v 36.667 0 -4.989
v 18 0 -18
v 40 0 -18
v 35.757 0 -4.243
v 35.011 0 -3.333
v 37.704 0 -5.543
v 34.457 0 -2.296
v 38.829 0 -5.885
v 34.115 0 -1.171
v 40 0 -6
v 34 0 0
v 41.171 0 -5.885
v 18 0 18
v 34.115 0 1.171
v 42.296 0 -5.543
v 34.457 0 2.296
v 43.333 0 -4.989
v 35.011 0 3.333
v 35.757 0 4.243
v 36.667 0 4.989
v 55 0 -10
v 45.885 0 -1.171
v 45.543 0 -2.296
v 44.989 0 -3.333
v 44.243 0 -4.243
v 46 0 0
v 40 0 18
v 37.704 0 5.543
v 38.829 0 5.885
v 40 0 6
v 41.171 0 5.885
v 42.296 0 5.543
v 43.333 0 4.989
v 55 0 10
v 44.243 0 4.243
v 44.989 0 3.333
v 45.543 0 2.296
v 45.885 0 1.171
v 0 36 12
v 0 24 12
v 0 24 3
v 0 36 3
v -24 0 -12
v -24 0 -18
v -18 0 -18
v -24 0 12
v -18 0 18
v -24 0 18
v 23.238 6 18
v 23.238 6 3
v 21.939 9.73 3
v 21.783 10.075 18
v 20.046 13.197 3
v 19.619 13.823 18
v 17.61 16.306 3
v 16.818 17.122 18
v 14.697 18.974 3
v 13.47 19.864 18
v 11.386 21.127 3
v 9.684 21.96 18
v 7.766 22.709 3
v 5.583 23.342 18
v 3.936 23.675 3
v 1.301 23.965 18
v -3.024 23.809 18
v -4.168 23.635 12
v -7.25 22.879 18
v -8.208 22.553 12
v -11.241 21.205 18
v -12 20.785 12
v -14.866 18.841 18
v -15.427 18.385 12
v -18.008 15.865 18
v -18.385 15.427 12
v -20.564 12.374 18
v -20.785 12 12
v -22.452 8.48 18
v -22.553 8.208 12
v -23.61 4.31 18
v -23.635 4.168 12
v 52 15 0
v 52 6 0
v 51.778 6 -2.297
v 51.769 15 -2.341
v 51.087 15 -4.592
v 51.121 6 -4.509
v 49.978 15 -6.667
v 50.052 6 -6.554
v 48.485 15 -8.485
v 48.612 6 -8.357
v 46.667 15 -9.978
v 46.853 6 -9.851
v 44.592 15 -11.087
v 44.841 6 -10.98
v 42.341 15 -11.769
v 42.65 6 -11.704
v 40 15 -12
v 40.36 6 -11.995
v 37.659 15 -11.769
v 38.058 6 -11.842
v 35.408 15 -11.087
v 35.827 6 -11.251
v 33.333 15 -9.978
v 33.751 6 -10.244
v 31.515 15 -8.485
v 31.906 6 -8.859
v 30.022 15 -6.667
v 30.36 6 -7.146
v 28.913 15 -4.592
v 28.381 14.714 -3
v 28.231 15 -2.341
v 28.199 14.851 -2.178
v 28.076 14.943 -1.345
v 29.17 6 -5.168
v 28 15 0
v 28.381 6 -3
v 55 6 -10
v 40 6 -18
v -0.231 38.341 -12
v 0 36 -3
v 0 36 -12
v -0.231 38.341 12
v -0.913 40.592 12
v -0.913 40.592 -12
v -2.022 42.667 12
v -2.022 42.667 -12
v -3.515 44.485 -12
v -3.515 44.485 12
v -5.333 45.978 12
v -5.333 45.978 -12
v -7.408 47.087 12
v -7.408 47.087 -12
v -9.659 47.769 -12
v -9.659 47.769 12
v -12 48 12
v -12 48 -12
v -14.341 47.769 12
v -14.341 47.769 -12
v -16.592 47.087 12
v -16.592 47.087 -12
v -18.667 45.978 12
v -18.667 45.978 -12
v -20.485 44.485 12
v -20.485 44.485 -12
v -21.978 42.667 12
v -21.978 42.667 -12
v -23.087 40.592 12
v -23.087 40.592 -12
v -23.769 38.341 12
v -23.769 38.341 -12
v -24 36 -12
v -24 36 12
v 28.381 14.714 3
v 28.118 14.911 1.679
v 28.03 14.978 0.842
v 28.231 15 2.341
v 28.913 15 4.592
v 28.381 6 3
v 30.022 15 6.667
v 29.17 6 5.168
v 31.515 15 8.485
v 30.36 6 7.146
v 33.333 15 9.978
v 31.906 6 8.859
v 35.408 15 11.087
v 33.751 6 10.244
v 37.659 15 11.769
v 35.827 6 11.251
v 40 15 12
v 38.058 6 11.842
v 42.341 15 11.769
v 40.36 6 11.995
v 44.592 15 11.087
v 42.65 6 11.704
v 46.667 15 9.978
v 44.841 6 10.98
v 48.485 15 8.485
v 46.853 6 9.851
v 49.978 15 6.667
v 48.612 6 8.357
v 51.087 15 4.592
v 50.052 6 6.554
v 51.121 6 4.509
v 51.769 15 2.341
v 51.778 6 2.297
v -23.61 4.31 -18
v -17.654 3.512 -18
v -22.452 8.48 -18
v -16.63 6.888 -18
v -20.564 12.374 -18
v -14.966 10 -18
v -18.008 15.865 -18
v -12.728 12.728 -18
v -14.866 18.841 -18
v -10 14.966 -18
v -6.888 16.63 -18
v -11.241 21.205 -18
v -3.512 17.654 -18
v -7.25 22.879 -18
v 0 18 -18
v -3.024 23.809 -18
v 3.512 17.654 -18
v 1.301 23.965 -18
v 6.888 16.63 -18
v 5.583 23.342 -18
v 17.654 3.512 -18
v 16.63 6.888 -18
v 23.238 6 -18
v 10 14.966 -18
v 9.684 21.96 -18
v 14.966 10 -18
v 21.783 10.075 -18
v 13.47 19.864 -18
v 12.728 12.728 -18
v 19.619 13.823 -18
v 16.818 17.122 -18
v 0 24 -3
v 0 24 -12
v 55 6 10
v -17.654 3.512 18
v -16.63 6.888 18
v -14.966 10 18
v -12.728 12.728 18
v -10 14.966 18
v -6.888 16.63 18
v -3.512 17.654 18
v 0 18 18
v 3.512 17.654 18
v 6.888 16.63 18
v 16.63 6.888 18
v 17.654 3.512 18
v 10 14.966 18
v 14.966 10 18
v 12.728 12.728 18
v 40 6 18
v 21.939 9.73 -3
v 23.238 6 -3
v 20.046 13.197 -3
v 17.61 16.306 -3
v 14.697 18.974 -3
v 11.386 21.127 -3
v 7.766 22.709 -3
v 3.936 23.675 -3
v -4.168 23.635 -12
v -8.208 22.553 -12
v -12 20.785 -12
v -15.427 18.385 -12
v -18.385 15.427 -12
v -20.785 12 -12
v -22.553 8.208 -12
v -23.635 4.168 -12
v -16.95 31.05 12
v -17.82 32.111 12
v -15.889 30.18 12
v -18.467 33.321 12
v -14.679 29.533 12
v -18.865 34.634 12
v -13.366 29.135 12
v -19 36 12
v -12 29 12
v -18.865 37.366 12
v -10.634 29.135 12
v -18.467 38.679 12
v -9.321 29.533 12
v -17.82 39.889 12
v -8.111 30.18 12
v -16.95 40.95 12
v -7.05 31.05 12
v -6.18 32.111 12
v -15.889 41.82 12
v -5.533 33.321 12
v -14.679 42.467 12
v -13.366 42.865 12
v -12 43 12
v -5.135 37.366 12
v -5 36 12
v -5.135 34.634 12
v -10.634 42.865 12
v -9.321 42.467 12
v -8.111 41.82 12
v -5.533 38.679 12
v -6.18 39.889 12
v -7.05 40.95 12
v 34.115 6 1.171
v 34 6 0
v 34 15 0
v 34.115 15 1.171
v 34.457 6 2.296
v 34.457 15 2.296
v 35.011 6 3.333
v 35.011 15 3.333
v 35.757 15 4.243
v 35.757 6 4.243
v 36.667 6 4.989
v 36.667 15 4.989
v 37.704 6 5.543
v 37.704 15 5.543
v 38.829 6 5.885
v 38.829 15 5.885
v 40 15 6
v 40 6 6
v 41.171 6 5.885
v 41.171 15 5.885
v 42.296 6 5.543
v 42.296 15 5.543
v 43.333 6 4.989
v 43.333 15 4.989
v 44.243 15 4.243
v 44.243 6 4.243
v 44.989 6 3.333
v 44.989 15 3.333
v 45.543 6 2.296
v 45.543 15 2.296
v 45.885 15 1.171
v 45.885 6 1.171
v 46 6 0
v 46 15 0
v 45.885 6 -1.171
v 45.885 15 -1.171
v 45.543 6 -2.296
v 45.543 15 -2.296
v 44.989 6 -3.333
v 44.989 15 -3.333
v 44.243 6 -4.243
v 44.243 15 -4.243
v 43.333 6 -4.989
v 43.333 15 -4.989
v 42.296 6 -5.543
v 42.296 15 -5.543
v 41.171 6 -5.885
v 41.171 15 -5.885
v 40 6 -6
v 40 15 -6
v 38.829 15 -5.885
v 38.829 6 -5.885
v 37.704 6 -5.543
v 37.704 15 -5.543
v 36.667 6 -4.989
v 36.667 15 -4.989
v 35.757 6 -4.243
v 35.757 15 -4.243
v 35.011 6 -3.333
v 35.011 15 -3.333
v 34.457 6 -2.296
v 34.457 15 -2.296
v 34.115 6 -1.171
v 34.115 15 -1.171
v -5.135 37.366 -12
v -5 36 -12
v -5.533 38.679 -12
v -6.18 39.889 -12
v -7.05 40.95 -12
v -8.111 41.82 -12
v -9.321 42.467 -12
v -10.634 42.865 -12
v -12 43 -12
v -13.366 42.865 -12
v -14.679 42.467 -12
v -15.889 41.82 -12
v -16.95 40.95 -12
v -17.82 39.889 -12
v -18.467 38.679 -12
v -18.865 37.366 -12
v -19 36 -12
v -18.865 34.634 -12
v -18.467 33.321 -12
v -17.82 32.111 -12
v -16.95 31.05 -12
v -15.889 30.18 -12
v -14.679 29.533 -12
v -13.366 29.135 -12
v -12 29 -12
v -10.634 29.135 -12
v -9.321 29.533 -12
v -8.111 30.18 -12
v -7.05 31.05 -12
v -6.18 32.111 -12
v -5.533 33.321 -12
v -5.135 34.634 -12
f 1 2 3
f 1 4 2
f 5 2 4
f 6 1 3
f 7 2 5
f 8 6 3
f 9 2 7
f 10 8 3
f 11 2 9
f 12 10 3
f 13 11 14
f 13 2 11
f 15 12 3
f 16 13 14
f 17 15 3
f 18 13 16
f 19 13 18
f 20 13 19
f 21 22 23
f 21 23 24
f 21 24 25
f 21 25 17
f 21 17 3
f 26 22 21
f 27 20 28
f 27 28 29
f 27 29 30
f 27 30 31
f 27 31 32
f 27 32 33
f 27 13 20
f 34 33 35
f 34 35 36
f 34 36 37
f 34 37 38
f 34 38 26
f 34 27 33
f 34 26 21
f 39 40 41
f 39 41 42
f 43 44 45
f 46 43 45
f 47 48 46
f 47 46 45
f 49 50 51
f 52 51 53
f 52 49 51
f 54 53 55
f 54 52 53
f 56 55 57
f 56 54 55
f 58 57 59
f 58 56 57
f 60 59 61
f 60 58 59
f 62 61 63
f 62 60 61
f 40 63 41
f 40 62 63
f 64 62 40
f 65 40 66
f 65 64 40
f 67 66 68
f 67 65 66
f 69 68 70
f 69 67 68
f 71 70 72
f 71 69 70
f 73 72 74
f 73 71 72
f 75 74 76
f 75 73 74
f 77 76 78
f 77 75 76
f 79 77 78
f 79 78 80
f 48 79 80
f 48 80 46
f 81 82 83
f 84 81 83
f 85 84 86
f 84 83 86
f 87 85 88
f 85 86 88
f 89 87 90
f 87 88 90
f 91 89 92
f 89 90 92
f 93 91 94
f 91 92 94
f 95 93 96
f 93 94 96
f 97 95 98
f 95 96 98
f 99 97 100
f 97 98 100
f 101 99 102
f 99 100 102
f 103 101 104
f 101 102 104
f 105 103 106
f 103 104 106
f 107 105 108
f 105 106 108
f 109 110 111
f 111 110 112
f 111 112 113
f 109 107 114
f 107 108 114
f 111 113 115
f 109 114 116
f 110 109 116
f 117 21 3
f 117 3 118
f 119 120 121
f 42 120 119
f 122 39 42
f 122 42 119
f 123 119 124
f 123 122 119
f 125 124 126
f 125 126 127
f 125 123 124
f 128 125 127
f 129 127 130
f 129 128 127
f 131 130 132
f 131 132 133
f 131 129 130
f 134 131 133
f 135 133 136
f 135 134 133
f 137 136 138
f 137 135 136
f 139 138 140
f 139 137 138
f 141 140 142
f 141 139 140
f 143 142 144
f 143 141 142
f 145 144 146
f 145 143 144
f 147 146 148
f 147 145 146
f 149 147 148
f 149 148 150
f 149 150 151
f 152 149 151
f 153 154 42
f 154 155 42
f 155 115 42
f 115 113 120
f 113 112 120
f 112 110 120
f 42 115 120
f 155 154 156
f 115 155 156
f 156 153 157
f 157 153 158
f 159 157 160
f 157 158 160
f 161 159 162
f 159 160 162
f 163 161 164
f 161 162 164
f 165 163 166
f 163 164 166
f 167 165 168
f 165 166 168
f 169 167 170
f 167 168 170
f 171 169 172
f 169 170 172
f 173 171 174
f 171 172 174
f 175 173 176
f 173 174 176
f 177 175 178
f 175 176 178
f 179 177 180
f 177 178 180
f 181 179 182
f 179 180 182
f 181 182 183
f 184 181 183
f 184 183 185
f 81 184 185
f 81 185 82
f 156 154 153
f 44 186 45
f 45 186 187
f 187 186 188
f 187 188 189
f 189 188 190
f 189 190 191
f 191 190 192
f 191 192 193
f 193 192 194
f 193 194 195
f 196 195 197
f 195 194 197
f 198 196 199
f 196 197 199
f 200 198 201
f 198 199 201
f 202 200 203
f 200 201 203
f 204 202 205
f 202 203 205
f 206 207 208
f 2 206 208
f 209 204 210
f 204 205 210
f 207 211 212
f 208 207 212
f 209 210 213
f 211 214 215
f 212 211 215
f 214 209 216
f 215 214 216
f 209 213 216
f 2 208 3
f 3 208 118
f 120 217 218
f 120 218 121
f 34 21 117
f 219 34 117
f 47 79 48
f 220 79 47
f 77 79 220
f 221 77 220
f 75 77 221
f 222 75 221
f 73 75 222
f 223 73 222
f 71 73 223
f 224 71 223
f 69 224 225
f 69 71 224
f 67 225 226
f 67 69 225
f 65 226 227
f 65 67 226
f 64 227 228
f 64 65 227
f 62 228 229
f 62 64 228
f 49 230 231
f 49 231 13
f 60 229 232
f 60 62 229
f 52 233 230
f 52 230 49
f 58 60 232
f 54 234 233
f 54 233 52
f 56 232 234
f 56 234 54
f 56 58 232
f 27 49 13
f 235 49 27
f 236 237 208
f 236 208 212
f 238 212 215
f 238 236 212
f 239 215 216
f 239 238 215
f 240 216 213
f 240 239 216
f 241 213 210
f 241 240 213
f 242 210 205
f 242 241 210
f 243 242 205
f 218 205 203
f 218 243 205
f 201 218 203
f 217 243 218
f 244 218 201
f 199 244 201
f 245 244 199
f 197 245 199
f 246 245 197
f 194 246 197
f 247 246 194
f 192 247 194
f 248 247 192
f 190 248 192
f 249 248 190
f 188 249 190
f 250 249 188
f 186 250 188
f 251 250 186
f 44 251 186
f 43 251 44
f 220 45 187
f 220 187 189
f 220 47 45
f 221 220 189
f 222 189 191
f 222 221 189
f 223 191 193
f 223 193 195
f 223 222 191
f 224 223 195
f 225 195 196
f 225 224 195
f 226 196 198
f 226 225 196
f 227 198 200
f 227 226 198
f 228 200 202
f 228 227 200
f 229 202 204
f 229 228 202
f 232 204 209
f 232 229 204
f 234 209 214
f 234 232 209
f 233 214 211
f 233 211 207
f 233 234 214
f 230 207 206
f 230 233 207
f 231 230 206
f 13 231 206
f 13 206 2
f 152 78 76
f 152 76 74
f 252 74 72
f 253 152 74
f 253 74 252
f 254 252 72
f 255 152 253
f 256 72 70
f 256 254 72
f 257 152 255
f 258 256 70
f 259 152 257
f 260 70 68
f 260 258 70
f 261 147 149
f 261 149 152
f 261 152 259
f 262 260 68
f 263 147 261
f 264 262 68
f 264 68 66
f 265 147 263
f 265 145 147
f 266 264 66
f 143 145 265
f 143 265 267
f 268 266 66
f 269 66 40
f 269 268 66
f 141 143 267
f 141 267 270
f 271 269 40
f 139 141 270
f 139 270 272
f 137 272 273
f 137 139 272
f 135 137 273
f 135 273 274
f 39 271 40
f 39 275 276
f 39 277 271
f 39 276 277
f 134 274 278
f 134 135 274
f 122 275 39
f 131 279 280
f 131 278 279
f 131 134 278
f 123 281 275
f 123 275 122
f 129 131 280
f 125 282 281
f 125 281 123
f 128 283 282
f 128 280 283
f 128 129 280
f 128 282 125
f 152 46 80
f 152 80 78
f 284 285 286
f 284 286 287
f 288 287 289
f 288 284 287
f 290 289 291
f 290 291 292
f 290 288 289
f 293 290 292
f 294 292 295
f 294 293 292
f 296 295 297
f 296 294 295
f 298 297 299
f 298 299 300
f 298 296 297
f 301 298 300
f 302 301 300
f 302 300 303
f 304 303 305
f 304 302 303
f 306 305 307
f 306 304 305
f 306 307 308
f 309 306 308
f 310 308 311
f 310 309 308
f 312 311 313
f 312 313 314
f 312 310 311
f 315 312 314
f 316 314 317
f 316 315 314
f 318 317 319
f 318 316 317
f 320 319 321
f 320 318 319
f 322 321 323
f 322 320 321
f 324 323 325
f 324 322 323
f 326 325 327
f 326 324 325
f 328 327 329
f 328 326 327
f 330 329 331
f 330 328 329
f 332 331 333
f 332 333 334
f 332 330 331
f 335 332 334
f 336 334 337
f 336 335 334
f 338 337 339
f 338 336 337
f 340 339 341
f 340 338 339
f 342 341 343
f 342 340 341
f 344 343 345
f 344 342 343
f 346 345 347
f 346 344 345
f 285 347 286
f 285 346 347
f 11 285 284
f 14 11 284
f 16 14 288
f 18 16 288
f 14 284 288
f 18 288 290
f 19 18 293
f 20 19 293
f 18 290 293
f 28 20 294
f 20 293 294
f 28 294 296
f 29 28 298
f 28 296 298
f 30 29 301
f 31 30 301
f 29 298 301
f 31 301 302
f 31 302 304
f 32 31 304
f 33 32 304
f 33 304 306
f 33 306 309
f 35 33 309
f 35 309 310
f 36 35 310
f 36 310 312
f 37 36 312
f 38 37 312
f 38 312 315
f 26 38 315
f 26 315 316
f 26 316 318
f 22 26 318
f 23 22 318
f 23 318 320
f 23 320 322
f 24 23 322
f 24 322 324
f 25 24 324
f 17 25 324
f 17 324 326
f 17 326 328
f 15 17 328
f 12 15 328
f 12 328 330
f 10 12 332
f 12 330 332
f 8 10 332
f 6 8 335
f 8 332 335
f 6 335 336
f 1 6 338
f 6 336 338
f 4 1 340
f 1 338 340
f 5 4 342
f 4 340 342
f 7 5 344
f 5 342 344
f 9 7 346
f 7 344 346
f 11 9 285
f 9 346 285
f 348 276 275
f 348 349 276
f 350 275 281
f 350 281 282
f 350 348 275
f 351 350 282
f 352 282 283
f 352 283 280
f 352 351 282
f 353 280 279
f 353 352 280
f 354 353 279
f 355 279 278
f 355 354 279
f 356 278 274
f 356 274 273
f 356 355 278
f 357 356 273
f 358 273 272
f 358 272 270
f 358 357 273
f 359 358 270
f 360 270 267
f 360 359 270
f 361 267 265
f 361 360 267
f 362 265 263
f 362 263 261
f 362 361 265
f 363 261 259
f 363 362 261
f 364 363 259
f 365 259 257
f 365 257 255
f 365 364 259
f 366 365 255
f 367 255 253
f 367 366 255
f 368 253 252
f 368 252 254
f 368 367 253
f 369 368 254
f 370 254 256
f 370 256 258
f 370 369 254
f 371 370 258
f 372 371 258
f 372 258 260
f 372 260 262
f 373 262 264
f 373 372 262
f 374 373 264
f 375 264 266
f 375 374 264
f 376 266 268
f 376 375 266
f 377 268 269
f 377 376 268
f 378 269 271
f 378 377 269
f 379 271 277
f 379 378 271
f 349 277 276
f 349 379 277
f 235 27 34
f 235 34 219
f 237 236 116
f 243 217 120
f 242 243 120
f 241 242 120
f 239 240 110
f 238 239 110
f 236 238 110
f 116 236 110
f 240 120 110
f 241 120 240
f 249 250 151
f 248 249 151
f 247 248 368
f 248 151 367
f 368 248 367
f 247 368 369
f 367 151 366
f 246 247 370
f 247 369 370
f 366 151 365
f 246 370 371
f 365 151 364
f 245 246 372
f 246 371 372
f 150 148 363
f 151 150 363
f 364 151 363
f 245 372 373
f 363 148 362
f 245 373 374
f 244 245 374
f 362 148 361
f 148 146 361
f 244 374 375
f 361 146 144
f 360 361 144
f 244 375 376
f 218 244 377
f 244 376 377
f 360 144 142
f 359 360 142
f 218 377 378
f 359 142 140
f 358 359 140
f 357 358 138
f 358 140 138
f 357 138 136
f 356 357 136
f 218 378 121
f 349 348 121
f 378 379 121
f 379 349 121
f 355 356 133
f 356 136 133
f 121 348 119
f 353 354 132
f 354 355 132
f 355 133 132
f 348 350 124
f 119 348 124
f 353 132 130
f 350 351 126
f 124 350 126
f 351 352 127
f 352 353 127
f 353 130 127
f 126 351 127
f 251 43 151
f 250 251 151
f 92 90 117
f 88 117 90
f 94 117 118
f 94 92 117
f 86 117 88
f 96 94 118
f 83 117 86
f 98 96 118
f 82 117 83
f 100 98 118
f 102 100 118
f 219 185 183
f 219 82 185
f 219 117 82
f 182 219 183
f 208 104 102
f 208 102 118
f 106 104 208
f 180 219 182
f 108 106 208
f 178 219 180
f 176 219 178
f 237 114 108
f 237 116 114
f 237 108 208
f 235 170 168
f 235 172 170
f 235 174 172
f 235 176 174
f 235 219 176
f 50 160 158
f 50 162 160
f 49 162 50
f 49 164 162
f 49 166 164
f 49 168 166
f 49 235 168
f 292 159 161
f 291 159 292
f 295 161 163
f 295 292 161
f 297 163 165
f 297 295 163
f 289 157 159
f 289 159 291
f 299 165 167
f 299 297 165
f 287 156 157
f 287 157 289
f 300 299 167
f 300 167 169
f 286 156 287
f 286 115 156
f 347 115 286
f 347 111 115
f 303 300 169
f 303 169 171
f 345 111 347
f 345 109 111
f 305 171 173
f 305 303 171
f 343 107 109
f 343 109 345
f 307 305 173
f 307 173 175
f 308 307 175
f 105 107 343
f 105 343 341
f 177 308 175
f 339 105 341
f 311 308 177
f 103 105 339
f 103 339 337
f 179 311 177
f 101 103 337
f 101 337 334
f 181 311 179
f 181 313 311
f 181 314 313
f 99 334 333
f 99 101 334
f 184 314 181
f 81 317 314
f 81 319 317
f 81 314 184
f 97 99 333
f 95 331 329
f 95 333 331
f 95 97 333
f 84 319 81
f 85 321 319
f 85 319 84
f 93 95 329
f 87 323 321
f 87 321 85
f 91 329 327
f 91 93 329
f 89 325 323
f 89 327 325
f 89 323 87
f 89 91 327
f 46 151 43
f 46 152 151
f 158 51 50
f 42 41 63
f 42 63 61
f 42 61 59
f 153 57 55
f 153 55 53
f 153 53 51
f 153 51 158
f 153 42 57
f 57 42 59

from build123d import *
from build123d.topology import SkipClean

# Parameters (mm, degrees)
BOSS_EXTRUDE1_DEPTH = 18
SKETCH1_3_R         = 7
BOSS_EXTRUDE2_DEPTH = 12
SKETCH2_R           = 12
SKETCH2_R_2         = 6
BOSS_EXTRUDE3_DEPTH = 9
RIB1_START          = -3
RIB1_DEPTH          = 6
CHAMFER1_SIZE       = 8
CHAMFER1_SIZE2      = 15
CHAMFER2_SIZE       = 15
CHAMFER2_SIZE2      = 8
SKETCH2_2_R         = 6
CUT_EXTRUDE1_DEPTH  = 72.505244563


# Read off the part's stored shape, not the designer's step: Rib1
with BuildPart() as part:
    # Sketch1 → Boss-Extrude1 (new, symmetric)
    with BuildSketch(Plane.XY):
        with BuildLine():
            Line((18, 0), (24, 0))
            ThreePointArc((24, 0), (0, 24), (-24, 0))
            Line((-24, 0), (-18, 0))
            ThreePointArc((-18, 0), (0, 18), (18, 0))
        make_face()
        with BuildLine():
            Line((55, 6), (23.237900077, 6))
            ThreePointArc((23.237900077, 6), (23.80871271, 3.02410302), (24, 0))
            Line((24, 0), (55, 0))
            Line((55, 0), (55, 6))
        make_face()
    extrude(amount=BOSS_EXTRUDE1_DEPTH, both=True)

    # Sketch1<3> → Boss-Extrude2 (add, symmetric)
    with BuildSketch(Plane.XY):
        with BuildLine():
            Line((-24, 36), (-24, 0))
            ThreePointArc((-24, 0), (-16.970562748, 16.970562748), (0, 24))
            Line((0, 24), (0, 36))
            ThreePointArc((0, 36), (-12, 48), (-24, 36))
        make_face()
        with Locations((-12, 36)):
            Circle(SKETCH1_3_R, mode=Mode.SUBTRACT)
    extrude(amount=BOSS_EXTRUDE2_DEPTH, both=True)

    # Sketch2 → Boss-Extrude3 (add)
    with BuildSketch(Plane(origin=(0, 6, 0), x_dir=(1, 0, 0), z_dir=(0, 1, 0))):
        with Locations((40, 0)):
            Circle(SKETCH2_R)
        with Locations(Location((40, 0, 0), (0, 0, 180))):
            Circle(SKETCH2_R_2, mode=Mode.SUBTRACT)
    extrude(amount=BOSS_EXTRUDE3_DEPTH)

    # Rib1 outline → Rib1 (add)
    with SkipClean():  # the faces are left unmerged after this step: merging them gives an invalid solid
        with BuildSketch(Plane.XY.offset(RIB1_START)):
            with BuildLine():
                Line((28.381049961, 14.714212529), (0, 36))
                Line((0, 36), (0, 24))
                ThreePointArc((0, 24), (14.696938456, 18.973665961), (23.237900077, 6))
                Line((23.237900077, 6), (30, 6))
                Line((30, 6), (30, 13.5))
                Line((30, 13.5), (28.381049961, 14.714212529))
            make_face()
        extrude(amount=RIB1_DEPTH)

    # Chamfer1
    chamfer1_edges = [part.edges().sort_by_distance(p)[0] for p in [
        (55, 3, 18),
    ]]
    chamfer1_side = [part.faces().sort_by_distance(p)[0] for p in [
        (55, 3, 0),
    ]]
    chamfer(chamfer1_edges, length=CHAMFER1_SIZE, length2=CHAMFER1_SIZE2, reference=chamfer1_side[0])

    # Chamfer2
    chamfer2_edges = [part.edges().sort_by_distance(p)[0] for p in [
        (55, 3, -18),
    ]]
    chamfer2_side = [part.faces().sort_by_distance(p)[0] for p in [
        (36.5, 0.825651258, -18),
    ]]
    chamfer(chamfer2_edges, length=CHAMFER2_SIZE, length2=CHAMFER2_SIZE2, reference=chamfer2_side[0])

    # Sketch2<2> → Cut-Extrude1 (cut, through all)
    with BuildSketch(Plane(origin=(0, 6, 0), x_dir=(1, 0, 0), z_dir=(0, 1, 0))):
        with Locations(Location((40, 0, 0), (0, 0, 180))):
            Circle(SKETCH2_2_R)
    extrude(amount=-CUT_EXTRUDE1_DEPTH, mode=Mode.SUBTRACT)


solid = part.part
